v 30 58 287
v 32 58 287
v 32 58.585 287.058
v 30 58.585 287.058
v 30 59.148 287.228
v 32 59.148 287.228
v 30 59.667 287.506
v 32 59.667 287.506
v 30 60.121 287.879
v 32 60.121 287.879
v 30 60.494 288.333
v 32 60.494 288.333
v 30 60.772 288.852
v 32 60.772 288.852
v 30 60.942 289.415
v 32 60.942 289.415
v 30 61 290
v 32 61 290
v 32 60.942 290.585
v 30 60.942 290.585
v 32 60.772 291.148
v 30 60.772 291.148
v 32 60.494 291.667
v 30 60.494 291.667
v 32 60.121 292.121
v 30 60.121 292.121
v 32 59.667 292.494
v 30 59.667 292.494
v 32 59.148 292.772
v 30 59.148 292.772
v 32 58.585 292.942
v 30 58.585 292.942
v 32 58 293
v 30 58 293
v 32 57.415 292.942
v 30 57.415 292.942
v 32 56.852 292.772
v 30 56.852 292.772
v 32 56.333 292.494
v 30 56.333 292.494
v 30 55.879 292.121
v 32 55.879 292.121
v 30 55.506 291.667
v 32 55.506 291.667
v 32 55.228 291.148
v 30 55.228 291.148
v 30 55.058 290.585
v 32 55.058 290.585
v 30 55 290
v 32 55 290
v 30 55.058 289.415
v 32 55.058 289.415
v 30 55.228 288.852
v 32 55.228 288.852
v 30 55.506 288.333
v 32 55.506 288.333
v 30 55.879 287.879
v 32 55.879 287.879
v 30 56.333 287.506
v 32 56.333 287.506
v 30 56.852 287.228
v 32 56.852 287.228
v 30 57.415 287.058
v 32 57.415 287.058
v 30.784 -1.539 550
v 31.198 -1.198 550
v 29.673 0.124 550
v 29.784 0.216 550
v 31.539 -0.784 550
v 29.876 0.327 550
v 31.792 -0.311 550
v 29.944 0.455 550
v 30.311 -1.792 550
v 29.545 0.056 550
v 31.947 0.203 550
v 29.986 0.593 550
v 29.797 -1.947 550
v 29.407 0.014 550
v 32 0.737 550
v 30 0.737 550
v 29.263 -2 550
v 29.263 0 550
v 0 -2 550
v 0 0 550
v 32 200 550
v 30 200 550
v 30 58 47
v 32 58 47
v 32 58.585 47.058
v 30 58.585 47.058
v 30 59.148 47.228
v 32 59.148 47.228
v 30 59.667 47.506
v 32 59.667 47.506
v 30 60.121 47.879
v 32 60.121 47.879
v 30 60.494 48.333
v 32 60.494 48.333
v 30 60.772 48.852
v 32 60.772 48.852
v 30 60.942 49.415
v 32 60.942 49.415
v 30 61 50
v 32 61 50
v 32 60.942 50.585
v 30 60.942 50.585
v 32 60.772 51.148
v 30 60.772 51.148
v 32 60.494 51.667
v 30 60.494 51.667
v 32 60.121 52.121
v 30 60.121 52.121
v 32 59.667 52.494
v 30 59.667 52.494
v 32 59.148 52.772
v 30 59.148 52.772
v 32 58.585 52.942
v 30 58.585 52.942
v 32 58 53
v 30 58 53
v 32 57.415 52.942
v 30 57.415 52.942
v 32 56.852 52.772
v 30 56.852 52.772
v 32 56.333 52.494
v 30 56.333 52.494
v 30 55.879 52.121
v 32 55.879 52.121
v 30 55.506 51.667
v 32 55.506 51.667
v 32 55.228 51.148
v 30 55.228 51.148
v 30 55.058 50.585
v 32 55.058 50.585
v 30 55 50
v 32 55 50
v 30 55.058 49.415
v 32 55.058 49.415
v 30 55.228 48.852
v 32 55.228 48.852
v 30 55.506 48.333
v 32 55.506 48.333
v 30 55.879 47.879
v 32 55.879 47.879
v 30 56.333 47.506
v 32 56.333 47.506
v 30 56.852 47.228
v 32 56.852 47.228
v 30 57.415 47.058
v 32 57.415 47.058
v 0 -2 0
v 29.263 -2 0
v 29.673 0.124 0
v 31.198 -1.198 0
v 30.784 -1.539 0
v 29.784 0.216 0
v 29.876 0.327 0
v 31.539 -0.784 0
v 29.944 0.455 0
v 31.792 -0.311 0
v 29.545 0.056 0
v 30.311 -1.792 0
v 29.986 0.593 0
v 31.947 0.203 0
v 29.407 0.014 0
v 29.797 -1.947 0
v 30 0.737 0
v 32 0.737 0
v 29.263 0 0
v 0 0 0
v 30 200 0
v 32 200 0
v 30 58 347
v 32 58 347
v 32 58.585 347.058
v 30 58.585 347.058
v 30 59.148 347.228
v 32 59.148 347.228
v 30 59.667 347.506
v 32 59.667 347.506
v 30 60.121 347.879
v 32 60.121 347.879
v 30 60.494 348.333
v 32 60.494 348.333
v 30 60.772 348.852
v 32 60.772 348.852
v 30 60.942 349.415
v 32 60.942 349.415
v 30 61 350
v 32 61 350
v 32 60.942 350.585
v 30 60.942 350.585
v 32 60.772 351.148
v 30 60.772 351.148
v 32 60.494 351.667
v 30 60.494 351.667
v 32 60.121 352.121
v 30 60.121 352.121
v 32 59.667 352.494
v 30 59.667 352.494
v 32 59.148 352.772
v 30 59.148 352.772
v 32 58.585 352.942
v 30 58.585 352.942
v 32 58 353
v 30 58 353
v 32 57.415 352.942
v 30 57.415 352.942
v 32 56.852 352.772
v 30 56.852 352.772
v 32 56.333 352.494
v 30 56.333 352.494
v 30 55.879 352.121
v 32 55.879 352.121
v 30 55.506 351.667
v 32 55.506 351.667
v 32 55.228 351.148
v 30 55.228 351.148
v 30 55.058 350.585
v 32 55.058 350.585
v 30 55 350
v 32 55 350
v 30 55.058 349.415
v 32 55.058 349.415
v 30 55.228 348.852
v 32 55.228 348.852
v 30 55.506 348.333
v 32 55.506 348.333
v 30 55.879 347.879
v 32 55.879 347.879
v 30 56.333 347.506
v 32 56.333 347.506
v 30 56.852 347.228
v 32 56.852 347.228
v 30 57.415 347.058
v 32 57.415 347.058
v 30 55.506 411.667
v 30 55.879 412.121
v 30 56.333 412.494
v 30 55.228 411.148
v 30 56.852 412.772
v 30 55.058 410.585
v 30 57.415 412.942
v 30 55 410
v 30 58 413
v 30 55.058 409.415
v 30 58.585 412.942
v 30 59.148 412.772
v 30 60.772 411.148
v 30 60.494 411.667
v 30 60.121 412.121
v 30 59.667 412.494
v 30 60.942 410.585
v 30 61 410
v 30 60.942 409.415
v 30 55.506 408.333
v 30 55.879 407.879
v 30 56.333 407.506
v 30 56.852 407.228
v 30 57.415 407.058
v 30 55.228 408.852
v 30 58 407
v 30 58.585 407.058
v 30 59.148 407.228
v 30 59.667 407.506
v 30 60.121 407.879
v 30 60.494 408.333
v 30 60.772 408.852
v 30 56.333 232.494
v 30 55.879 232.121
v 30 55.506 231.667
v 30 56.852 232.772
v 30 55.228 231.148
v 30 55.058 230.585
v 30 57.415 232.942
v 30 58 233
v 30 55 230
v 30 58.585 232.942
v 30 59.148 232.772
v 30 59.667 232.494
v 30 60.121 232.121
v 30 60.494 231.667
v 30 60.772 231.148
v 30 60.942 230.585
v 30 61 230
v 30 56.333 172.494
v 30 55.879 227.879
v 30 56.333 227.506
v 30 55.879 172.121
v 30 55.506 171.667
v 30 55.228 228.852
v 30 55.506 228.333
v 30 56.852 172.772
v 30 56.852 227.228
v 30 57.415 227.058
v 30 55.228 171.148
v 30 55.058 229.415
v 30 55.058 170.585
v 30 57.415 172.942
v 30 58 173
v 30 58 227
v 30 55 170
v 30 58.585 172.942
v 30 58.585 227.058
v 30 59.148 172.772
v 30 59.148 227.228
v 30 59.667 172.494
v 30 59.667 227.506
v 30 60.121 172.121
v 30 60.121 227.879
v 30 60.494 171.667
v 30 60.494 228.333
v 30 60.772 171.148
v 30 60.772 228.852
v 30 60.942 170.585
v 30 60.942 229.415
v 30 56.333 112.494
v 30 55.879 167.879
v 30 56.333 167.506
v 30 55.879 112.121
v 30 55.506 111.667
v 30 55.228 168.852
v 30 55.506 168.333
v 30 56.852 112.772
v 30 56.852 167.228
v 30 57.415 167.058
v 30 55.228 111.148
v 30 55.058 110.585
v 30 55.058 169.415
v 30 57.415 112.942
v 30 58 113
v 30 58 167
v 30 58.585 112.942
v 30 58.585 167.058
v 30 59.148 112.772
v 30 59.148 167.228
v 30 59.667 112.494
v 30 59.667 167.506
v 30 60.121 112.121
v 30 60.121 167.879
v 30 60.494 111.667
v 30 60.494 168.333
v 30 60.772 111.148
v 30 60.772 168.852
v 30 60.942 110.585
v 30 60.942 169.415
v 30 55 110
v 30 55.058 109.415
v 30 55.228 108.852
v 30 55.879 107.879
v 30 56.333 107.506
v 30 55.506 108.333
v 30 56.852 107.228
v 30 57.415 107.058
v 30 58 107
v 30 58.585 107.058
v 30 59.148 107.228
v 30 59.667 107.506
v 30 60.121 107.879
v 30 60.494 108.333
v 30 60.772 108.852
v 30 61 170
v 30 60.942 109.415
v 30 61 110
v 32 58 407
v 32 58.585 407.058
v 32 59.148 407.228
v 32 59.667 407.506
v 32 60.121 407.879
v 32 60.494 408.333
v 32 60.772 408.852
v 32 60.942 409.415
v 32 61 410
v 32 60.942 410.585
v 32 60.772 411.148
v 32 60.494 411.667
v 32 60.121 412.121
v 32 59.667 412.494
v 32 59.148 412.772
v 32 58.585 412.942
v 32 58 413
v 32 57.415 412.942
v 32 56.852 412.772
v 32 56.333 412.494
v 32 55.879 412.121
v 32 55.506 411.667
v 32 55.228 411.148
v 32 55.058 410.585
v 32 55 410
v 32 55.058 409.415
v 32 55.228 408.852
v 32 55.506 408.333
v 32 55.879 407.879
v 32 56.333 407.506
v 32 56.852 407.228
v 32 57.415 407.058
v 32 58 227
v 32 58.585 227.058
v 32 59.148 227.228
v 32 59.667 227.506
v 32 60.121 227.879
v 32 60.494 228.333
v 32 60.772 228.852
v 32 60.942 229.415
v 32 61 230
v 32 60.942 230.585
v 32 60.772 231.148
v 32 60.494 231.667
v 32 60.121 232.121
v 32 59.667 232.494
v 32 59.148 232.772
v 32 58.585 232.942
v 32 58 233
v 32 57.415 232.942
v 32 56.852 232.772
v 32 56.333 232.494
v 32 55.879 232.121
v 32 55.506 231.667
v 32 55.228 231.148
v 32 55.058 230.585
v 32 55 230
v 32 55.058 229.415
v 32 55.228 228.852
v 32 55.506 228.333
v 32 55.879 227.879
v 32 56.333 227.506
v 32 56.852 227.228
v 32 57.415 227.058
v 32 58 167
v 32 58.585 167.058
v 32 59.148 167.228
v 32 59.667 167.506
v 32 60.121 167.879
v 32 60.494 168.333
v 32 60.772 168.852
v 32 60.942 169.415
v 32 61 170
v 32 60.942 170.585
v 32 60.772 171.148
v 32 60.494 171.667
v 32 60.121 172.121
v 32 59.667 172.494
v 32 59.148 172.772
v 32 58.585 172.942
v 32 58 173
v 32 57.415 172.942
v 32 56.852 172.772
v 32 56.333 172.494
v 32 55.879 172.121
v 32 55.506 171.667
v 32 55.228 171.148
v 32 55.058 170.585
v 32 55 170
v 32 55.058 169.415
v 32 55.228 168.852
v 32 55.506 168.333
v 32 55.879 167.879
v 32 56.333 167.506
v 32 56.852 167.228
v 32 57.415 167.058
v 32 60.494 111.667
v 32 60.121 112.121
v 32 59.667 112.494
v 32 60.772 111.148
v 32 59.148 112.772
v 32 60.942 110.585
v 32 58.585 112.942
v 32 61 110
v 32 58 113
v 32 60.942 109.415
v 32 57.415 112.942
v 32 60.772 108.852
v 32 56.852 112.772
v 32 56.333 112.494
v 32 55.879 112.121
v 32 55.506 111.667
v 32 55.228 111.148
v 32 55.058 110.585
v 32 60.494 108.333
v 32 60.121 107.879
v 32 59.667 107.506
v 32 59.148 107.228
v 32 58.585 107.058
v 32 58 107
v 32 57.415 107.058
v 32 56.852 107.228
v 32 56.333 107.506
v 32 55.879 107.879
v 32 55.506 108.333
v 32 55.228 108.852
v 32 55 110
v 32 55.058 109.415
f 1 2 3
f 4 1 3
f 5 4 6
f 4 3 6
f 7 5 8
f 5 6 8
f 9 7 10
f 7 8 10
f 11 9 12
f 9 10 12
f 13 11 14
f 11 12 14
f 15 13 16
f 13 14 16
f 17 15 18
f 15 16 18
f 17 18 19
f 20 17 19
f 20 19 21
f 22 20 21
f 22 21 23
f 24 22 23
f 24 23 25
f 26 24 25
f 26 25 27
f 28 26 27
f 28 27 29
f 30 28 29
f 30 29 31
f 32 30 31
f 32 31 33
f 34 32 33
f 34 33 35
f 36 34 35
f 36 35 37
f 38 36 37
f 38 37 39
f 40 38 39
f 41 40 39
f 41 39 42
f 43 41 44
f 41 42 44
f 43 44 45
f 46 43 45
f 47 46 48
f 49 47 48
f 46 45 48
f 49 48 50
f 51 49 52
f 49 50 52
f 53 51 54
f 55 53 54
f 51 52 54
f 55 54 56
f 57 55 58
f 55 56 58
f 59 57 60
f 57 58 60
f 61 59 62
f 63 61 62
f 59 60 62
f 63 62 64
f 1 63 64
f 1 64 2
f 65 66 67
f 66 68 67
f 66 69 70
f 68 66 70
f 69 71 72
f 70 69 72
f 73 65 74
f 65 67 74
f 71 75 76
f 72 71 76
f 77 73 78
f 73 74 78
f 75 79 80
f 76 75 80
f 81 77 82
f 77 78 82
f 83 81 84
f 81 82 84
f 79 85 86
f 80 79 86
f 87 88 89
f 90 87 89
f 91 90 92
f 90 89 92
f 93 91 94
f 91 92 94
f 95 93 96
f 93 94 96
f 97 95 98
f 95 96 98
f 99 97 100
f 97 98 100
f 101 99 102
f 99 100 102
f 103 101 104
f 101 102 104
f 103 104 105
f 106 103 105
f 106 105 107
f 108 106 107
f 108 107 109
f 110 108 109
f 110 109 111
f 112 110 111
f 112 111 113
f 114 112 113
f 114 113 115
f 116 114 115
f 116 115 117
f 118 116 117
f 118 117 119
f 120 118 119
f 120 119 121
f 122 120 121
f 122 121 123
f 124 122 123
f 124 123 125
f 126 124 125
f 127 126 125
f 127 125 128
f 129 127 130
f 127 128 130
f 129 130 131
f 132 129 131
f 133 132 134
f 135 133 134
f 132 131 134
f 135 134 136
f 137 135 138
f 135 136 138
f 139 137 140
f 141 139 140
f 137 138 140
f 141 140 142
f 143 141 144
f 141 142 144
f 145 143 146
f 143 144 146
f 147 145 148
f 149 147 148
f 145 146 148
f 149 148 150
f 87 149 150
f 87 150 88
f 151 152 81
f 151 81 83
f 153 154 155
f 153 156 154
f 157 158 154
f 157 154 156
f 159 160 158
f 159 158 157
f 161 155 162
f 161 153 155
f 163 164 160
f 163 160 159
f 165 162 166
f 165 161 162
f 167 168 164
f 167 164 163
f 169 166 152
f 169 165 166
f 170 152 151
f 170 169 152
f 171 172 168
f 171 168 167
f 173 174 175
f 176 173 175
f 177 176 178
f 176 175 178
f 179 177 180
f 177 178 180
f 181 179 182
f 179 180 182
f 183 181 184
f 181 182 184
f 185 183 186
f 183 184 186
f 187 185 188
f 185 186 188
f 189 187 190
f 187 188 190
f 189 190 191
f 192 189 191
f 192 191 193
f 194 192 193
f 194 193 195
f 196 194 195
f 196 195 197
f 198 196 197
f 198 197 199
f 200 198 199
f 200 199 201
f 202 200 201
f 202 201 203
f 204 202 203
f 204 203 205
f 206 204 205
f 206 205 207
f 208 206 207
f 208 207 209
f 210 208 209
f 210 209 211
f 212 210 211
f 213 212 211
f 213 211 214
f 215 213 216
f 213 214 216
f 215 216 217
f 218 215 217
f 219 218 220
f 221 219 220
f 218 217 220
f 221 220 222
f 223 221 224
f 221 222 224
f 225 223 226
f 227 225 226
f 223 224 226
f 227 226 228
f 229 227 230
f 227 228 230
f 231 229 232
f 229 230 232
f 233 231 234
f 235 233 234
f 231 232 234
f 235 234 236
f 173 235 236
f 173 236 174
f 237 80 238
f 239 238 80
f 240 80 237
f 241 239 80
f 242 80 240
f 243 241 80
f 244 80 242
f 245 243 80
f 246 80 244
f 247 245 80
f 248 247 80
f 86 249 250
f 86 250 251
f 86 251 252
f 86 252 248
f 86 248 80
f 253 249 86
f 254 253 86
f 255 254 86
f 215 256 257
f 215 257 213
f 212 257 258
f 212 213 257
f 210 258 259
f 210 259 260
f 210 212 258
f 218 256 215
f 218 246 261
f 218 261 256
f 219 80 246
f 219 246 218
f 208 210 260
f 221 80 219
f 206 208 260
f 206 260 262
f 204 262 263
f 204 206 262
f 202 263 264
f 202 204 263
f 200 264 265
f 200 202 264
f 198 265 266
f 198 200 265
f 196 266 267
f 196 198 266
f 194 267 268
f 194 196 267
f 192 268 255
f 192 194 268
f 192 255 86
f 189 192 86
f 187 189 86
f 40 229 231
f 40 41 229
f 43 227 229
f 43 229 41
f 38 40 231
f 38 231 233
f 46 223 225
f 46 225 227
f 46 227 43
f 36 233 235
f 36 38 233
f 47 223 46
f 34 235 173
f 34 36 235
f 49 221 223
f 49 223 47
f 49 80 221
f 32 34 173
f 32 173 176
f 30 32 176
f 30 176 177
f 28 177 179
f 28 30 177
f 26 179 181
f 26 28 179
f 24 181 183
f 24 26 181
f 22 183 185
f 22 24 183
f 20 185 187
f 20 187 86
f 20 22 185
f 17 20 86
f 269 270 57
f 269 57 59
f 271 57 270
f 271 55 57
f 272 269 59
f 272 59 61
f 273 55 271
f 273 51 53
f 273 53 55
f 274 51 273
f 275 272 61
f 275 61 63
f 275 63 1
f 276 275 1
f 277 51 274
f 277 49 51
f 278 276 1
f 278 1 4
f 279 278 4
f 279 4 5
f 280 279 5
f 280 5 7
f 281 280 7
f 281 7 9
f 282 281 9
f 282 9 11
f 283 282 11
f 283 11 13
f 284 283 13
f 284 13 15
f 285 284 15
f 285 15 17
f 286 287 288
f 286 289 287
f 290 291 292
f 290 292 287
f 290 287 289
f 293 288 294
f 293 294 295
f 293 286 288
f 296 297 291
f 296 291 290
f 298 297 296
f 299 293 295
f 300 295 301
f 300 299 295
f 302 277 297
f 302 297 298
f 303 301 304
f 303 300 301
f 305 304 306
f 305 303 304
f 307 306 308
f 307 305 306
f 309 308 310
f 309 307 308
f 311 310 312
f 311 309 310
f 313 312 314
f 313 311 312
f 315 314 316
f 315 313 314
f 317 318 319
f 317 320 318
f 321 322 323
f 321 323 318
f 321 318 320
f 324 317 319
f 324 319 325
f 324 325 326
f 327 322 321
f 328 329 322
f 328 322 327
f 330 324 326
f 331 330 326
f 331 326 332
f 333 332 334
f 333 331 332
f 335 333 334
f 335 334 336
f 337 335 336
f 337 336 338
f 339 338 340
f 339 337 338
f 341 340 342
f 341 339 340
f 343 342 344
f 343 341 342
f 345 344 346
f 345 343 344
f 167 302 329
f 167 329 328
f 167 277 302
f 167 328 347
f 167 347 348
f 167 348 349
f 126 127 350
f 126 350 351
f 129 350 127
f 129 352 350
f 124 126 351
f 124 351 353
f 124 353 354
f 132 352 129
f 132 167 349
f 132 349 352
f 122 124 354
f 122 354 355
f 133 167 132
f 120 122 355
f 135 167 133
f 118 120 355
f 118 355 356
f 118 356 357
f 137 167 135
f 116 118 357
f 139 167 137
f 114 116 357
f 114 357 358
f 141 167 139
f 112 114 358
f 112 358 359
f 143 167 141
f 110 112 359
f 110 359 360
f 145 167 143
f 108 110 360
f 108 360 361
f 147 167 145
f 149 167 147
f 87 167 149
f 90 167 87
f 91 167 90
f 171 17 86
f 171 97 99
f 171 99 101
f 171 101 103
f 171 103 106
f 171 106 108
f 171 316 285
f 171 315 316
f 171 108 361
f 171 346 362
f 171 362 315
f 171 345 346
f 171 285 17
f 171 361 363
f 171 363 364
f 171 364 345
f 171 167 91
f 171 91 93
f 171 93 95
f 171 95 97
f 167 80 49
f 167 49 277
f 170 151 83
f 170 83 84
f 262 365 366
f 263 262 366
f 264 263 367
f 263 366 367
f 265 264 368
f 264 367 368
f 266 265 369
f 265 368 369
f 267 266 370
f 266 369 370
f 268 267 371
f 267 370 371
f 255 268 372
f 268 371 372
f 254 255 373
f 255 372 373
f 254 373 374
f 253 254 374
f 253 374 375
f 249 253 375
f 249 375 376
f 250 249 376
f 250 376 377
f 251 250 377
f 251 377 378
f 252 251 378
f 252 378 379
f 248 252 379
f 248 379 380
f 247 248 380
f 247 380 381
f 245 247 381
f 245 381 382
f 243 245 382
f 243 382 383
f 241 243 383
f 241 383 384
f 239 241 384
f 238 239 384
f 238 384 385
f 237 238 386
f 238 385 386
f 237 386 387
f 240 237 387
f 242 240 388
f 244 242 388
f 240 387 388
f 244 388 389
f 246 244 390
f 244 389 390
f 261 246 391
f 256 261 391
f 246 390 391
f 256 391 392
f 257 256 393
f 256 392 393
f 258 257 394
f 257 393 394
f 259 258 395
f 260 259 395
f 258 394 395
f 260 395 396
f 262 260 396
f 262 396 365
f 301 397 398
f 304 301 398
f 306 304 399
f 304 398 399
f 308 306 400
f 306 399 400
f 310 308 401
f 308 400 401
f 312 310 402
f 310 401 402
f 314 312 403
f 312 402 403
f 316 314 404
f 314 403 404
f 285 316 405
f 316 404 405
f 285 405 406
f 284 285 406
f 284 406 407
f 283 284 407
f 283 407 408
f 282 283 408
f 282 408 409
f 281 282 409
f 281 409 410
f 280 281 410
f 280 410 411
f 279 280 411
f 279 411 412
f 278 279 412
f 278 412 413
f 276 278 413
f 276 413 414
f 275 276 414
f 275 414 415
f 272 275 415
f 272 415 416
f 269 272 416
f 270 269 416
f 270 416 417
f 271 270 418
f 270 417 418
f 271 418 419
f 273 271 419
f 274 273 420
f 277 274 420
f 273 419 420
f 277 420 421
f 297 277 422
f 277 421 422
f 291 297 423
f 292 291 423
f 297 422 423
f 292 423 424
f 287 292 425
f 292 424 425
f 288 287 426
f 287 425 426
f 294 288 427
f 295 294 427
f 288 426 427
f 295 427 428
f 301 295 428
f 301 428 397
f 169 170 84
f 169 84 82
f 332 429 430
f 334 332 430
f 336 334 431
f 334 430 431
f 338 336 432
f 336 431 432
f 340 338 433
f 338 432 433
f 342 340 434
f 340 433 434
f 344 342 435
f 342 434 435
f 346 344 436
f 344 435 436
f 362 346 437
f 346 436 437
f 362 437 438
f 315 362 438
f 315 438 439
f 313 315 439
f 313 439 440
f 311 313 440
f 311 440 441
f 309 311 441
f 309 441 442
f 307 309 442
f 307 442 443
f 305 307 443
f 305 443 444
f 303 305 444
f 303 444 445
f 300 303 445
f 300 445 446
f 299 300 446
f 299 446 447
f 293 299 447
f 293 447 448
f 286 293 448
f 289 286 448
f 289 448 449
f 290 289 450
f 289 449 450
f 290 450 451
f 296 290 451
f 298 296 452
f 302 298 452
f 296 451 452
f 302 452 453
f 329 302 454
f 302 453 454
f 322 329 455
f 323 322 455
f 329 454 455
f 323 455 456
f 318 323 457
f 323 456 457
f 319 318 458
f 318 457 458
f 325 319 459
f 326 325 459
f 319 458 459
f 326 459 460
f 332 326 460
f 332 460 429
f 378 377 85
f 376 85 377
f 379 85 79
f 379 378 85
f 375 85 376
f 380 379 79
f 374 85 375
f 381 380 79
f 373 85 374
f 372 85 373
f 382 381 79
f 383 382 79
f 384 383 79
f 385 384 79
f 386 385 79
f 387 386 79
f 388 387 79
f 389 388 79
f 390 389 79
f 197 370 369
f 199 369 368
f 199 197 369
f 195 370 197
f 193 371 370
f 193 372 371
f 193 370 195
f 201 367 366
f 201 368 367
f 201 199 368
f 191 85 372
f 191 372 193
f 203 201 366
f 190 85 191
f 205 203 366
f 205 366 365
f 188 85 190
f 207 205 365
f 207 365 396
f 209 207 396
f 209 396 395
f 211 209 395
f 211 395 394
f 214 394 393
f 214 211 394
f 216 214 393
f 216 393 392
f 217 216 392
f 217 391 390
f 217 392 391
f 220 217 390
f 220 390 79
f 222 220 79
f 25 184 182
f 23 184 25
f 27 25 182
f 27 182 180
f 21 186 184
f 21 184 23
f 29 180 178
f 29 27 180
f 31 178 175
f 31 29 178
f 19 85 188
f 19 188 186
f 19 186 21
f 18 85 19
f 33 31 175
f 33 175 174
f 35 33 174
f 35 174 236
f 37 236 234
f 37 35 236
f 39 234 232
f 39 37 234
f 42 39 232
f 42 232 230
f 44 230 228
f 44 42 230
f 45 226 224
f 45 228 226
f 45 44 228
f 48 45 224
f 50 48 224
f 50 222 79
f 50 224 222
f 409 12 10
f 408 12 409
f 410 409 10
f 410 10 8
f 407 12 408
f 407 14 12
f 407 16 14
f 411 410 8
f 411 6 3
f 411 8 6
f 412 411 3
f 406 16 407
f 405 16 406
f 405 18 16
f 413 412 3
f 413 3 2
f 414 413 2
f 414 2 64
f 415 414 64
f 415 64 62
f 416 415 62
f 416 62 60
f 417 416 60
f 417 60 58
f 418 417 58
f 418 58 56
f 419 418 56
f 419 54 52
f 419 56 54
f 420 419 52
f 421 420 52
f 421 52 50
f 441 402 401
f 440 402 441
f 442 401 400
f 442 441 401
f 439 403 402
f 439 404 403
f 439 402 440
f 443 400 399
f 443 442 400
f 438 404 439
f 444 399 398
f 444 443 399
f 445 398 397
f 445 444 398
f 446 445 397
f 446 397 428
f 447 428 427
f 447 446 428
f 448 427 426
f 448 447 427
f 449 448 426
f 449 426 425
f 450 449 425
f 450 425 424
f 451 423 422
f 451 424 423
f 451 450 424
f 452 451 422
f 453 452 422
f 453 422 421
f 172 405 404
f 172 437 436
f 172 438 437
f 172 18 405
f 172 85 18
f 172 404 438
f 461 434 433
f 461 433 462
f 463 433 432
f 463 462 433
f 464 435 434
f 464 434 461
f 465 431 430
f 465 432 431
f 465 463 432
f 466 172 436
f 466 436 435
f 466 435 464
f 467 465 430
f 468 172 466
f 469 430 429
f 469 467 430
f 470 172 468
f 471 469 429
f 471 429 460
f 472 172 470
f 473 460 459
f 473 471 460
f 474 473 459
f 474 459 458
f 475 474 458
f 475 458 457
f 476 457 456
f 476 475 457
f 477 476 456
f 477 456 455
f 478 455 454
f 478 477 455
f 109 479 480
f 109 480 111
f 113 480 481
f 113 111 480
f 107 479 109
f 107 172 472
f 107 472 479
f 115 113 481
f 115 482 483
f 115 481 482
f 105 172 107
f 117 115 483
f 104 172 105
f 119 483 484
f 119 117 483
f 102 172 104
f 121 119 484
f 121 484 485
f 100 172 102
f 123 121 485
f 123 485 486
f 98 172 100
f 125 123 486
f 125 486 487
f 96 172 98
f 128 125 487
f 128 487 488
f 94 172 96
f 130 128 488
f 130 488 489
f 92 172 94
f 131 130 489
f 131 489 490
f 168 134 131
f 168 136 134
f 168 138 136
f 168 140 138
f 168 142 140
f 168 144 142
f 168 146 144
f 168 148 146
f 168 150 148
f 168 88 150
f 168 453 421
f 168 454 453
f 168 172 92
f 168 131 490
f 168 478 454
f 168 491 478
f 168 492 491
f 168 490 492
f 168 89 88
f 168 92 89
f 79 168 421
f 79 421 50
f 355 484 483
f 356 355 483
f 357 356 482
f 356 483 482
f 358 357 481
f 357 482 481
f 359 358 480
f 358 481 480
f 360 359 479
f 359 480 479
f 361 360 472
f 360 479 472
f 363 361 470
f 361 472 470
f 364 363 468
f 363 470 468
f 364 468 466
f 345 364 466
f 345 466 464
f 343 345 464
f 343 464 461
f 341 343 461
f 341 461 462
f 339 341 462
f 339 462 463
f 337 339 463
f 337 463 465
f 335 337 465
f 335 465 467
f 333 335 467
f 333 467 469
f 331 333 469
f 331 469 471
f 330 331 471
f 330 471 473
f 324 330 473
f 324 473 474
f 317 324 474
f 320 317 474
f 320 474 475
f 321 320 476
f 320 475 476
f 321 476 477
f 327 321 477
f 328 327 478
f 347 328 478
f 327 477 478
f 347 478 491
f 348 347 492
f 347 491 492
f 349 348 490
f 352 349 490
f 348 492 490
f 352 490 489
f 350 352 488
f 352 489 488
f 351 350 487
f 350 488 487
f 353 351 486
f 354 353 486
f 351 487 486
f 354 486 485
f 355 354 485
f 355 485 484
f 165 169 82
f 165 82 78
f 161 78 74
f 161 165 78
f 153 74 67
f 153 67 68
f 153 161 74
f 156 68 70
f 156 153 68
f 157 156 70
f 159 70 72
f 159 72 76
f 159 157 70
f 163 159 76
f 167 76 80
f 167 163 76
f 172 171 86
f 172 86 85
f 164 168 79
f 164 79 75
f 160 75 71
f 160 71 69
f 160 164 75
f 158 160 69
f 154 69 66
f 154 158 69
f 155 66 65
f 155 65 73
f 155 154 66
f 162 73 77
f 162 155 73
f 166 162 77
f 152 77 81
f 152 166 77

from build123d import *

# Parameters (mm, degrees)
BASE_FLANGE1_DEPTH = 550
SKETCH10_R         = 3
CUT_EXTRUDE2_DEPTH = 10


# Sheet-metal steps are written as plain solids
with BuildPart() as part:
    # Sketch1 → Base-Flange1 (new body)
    with BuildSketch(Plane.XY):
        with BuildLine():
            Line((0, 0), (29.2634, 0))
            ThreePointArc((29.2634, 0), (29.784254855, 0.215745145), (30, 0.7366))
            Line((30, 0.7366), (30, 200))
            Line((30, 200), (32, 200))
            Line((32, 200), (32, 0.7366))
            ThreePointArc((32, 0.7366), (31.198468417, -1.198468417), (29.2634, -2))
            Line((29.2634, -2), (0, -2))
            Line((0, -2), (0, 0))
        make_face()
    extrude(amount=BASE_FLANGE1_DEPTH)

    # Sketch10 → Cut-Extrude2 (cut)
    with BuildSketch(Plane(origin=(32, 0, 0), x_dir=(0, 0, -1), z_dir=(1, 0, 0))):
        with Locations((-50, 58)):
            Circle(SKETCH10_R)
        with Locations((-110, 58)):
            Circle(SKETCH10_R)
        with Locations((-170, 58)):
            Circle(SKETCH10_R)
        with Locations((-230, 58)):
            Circle(SKETCH10_R)
        with Locations((-290, 58)):
            Circle(SKETCH10_R)
        with Locations((-350, 58)):
            Circle(SKETCH10_R)
        with Locations((-410, 58)):
            Circle(SKETCH10_R)
    extrude(amount=-CUT_EXTRUDE2_DEPTH, mode=Mode.SUBTRACT)


solid = part.part
